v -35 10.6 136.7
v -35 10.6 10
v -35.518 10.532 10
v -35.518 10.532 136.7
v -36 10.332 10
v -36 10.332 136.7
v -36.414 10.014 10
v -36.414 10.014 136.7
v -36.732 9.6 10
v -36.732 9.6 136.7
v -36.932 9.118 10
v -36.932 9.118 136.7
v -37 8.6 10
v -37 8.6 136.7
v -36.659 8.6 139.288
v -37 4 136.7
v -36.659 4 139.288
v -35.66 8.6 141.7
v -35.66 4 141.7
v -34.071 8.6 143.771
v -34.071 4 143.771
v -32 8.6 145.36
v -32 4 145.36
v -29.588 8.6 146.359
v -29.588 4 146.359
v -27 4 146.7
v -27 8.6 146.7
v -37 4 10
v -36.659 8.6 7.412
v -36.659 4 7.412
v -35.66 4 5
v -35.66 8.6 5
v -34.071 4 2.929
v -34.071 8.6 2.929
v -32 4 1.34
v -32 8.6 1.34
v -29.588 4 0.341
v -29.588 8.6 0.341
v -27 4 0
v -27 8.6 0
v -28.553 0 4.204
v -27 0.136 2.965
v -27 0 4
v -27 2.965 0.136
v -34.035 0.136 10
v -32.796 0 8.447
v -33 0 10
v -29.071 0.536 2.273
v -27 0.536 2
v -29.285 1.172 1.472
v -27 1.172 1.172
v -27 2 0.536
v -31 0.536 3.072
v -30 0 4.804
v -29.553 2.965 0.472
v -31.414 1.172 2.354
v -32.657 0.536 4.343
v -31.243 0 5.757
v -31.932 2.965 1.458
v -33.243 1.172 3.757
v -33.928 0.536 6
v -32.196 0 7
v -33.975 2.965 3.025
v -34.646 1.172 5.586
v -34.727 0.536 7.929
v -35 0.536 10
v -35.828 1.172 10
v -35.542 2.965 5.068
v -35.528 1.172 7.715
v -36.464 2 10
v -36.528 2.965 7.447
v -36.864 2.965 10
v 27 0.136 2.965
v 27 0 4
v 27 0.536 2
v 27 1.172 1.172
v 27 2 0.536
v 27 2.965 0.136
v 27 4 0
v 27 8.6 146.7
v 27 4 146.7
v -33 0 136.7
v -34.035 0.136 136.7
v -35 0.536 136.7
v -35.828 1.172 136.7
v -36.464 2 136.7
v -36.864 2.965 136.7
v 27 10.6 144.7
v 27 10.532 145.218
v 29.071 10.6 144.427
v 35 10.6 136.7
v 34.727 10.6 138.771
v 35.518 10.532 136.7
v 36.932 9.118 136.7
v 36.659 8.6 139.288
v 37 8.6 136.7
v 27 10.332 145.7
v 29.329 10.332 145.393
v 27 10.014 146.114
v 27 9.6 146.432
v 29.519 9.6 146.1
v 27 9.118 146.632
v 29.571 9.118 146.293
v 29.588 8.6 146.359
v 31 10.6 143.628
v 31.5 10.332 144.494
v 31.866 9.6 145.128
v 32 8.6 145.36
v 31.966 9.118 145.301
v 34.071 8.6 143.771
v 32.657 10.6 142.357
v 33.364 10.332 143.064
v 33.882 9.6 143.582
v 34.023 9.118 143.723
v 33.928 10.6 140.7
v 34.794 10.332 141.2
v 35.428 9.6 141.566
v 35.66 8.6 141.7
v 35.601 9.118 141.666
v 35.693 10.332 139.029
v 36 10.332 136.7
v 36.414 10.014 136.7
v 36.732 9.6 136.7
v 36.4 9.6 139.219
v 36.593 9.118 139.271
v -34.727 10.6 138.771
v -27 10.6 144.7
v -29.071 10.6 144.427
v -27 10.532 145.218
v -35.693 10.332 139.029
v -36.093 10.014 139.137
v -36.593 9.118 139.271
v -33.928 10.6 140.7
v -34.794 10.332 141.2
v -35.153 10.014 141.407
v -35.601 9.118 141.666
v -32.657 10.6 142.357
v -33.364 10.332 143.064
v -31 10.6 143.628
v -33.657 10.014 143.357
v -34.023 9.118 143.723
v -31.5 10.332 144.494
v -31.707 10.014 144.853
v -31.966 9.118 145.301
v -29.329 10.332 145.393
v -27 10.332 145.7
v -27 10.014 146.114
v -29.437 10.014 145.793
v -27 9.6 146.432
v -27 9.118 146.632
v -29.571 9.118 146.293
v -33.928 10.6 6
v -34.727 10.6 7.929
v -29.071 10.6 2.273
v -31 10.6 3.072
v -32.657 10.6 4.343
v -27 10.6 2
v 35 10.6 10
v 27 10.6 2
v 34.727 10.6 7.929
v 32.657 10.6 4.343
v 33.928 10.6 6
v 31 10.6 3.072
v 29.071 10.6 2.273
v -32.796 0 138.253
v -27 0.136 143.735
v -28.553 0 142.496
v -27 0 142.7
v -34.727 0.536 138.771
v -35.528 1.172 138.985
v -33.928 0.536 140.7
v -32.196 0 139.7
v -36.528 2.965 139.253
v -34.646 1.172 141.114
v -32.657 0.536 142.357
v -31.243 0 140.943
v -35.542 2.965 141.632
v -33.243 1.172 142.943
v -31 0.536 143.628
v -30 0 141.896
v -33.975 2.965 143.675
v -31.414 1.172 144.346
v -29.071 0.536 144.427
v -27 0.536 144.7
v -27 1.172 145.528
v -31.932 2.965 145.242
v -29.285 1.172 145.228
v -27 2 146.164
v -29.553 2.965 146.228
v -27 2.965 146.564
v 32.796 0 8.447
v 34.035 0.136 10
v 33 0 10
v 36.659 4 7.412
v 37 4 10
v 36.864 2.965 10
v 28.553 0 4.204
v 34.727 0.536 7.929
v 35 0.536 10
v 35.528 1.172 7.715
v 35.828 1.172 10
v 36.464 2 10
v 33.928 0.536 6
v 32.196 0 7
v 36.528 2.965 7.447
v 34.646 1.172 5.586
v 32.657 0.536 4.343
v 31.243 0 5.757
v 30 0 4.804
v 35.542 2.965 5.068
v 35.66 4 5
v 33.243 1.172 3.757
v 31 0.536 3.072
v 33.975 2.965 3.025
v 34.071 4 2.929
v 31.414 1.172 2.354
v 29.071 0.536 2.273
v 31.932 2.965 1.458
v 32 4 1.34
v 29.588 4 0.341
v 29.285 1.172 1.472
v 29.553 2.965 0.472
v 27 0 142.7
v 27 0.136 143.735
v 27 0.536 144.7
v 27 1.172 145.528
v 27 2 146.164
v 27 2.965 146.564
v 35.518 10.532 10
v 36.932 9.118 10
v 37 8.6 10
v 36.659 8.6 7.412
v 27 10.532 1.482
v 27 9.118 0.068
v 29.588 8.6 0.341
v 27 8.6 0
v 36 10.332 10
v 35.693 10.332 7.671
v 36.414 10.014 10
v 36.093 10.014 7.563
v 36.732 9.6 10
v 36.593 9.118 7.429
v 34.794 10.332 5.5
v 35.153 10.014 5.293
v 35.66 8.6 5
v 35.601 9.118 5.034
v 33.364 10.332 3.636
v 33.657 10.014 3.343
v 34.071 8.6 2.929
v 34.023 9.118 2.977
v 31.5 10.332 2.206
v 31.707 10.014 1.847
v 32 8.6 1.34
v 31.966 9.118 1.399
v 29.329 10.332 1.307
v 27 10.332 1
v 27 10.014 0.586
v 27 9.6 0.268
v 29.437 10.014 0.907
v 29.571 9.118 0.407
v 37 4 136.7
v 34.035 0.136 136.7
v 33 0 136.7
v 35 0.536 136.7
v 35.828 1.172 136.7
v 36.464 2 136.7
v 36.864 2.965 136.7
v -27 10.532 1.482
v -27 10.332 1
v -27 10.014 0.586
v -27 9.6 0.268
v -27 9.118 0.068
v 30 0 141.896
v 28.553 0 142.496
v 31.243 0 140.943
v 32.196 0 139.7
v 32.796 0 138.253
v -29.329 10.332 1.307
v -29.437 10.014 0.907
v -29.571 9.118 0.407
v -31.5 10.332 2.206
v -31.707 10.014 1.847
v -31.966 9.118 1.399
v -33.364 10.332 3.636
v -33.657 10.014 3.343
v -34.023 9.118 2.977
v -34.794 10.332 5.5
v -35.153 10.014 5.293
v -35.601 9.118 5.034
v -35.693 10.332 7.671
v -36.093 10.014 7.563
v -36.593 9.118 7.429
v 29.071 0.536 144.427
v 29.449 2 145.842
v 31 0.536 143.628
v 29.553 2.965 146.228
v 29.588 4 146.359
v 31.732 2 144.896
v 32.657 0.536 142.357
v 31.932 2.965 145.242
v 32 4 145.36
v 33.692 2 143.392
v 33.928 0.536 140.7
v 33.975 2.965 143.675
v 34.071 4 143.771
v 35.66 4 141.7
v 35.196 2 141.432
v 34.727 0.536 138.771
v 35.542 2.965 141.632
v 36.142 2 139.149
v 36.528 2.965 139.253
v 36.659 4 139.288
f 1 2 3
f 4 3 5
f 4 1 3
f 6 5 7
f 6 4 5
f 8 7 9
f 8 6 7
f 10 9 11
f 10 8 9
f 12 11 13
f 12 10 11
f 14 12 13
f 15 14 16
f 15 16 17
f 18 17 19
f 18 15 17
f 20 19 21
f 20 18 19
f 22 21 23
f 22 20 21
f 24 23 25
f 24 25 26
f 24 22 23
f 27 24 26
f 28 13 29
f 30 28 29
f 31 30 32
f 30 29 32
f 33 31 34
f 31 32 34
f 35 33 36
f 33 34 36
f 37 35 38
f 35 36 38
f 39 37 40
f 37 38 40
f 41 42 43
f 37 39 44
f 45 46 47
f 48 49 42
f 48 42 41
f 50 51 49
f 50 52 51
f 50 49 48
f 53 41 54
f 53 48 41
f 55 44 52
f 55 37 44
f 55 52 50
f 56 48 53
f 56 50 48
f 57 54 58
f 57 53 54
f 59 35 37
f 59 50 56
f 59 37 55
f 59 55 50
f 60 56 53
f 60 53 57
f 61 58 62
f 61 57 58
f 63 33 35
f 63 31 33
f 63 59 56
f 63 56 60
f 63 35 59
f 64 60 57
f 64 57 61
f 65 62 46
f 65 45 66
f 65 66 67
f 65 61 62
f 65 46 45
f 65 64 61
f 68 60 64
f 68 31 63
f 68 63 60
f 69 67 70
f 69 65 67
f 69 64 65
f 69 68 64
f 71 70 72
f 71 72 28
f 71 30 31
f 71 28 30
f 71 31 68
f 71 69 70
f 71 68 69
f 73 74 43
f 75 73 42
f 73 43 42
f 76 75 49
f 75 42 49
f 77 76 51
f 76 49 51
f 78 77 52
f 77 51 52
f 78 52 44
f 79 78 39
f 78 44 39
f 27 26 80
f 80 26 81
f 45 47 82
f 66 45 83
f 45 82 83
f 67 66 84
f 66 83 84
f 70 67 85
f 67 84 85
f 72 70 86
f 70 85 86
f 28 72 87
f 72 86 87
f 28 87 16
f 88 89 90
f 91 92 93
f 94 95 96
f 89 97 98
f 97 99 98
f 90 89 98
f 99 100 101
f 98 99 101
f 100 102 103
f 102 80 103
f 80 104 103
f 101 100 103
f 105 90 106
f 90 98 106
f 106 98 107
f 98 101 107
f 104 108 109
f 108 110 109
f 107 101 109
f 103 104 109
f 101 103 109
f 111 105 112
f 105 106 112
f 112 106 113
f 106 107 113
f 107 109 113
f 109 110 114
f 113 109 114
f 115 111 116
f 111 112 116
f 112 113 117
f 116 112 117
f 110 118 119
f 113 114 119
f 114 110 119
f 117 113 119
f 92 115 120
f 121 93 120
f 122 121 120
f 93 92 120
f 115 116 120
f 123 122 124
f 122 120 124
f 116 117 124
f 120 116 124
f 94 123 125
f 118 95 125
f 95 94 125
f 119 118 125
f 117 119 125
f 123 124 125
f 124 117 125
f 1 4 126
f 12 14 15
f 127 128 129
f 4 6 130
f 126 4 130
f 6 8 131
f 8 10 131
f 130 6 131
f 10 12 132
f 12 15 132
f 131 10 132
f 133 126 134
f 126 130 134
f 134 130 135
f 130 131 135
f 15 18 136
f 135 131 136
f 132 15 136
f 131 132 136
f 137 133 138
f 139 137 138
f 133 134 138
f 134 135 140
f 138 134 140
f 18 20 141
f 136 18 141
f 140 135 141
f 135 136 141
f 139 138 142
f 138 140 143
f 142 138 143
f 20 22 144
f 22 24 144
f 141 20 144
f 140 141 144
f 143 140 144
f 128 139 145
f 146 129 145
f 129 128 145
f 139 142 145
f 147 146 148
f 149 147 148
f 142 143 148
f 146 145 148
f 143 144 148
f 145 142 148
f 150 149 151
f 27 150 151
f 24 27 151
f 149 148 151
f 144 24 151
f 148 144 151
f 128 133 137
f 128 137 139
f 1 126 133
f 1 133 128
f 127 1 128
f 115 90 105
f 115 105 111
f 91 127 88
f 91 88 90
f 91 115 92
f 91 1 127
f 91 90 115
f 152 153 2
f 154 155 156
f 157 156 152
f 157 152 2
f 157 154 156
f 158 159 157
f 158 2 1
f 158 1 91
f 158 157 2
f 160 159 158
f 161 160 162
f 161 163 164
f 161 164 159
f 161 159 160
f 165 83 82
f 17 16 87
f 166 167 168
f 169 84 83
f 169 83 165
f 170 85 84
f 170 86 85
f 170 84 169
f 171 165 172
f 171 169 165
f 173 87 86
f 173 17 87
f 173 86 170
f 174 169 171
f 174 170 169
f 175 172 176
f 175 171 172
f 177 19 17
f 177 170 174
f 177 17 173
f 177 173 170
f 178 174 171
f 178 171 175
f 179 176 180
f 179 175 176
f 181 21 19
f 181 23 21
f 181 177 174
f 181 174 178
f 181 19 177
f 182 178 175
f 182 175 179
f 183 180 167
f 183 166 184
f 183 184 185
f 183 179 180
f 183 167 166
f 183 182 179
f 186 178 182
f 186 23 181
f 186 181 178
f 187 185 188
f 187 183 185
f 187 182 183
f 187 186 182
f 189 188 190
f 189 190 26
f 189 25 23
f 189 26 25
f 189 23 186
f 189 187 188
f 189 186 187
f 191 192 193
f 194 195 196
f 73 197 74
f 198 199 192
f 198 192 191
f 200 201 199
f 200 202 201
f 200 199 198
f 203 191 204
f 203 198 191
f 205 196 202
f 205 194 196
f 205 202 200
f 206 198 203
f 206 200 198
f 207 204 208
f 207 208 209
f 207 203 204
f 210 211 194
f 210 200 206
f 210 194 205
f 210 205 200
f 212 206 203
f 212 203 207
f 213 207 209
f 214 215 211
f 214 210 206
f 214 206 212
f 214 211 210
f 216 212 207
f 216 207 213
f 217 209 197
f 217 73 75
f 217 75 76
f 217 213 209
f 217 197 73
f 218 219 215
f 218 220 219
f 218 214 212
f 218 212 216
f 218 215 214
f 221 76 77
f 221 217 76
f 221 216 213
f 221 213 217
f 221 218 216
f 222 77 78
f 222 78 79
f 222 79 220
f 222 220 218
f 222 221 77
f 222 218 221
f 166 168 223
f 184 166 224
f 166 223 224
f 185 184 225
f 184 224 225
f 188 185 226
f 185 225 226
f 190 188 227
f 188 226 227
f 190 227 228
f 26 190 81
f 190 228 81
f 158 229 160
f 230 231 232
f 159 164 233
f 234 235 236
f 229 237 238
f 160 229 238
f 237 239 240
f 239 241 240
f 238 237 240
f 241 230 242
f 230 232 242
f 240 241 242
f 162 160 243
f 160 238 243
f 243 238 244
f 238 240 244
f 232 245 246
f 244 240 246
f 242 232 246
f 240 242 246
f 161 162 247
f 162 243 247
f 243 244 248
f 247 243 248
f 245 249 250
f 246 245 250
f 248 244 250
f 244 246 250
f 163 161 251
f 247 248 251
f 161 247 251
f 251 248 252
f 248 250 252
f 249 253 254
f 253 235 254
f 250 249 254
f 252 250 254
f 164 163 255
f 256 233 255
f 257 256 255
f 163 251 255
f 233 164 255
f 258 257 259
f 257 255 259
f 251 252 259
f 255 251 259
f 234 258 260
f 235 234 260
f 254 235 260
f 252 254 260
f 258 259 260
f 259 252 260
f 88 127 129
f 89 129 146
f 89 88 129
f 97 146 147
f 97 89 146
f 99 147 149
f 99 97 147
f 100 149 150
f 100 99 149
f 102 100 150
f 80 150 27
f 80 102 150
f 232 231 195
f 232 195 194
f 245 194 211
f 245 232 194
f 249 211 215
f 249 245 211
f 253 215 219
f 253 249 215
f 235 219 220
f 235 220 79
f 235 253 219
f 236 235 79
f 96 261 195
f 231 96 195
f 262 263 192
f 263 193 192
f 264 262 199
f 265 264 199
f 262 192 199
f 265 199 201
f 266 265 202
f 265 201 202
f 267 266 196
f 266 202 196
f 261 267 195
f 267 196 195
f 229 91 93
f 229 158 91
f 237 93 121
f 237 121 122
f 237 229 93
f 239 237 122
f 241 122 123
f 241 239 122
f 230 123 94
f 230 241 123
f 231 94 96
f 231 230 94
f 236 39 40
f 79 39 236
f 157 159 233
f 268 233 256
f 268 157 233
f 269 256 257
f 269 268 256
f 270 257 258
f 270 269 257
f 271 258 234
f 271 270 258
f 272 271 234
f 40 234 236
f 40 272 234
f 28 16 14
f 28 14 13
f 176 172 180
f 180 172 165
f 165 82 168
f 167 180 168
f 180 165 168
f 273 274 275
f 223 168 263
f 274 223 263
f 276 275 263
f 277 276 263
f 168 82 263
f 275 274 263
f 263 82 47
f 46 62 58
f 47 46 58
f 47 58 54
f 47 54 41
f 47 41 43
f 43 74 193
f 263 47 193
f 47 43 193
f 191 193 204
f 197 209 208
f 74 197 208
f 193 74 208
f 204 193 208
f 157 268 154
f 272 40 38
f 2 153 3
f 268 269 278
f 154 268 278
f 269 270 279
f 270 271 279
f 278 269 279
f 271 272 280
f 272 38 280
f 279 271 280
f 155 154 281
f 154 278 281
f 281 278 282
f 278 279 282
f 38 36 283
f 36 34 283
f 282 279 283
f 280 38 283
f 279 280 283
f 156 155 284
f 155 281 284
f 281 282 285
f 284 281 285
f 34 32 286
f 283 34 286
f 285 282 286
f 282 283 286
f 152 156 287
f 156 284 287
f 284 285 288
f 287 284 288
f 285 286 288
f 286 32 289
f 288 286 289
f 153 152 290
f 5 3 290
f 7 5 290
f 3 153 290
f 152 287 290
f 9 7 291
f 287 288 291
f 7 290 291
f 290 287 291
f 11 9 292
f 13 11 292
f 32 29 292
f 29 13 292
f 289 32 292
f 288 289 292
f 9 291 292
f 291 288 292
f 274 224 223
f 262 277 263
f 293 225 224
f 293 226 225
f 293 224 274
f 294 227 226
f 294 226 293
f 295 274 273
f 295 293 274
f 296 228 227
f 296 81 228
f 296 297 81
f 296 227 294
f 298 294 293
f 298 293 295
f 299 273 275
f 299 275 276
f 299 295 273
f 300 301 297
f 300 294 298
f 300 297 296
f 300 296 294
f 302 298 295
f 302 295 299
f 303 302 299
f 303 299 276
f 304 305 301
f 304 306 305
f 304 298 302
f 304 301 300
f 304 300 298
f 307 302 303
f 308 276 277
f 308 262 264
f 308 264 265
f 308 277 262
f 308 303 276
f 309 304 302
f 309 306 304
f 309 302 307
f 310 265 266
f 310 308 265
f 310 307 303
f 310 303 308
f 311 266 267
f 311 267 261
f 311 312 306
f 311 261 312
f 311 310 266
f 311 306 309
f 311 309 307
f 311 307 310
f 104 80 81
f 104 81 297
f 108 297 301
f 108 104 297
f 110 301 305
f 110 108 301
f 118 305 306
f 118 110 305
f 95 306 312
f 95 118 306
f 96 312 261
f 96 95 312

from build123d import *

# Parameters (mm, degrees)
SKETCH_1_W      = 74
SKETCH_1_H      = 146.7
EXTRUDE_1_DEPTH = 10.6
FILLET_1_R      = 10
FILLET_2_R      = 4
FILLET_3_R      = 2


with BuildPart() as part:
    # 草图1 → 凸台-拉伸1 (new body)
    with BuildSketch(Plane(origin=(0, 0, 0), x_dir=(1, 0, 0), z_dir=(0, 1, 0))):
        with Locations((0, -73.35)):
            Rectangle(SKETCH_1_W, SKETCH_1_H)
    extrude(amount=EXTRUDE_1_DEPTH)

    # 圆角1
    fillet_1_edges = [part.edges().sort_by_distance(p)[0] for p in [
        (-37, 5.3, 0),
        (37, 5.3, 0),
        (37, 5.3, 146.7),
        (-37, 5.3, 146.7),
    ]]
    fillet(fillet_1_edges, radius=FILLET_1_R)

    # 圆角2
    fillet_2_edges = [part.edges().sort_by_distance(p)[0] for p in [
        (37, 0, 73.35),
        (-37, 0, 73.35),
        (0, 0, 0),
        (0, 0, 146.7),
        (34.071067812, 0, 2.928932188),
        (-34.071067812, 0, 2.928932188),
        (-34.071067812, 0, 143.771067812),
        (34.071067812, 0, 143.771067812),
    ]]
    fillet(fillet_2_edges, radius=FILLET_2_R)

    # 圆角3
    fillet_3_edges = [part.edges().sort_by_distance(p)[0] for p in [
        (37, 10.6, 73.35),
        (0, 10.6, 146.7),
        (-37, 10.6, 73.35),
        (0, 10.6, 0),
        (34.071067812, 10.6, 2.928932188),
        (-34.071067812, 10.6, 2.928932188),
        (-34.071067812, 10.6, 143.771067812),
        (34.071067812, 10.6, 143.771067812),
    ]]
    fillet(fillet_3_edges, radius=FILLET_3_R)


solid = part.part
